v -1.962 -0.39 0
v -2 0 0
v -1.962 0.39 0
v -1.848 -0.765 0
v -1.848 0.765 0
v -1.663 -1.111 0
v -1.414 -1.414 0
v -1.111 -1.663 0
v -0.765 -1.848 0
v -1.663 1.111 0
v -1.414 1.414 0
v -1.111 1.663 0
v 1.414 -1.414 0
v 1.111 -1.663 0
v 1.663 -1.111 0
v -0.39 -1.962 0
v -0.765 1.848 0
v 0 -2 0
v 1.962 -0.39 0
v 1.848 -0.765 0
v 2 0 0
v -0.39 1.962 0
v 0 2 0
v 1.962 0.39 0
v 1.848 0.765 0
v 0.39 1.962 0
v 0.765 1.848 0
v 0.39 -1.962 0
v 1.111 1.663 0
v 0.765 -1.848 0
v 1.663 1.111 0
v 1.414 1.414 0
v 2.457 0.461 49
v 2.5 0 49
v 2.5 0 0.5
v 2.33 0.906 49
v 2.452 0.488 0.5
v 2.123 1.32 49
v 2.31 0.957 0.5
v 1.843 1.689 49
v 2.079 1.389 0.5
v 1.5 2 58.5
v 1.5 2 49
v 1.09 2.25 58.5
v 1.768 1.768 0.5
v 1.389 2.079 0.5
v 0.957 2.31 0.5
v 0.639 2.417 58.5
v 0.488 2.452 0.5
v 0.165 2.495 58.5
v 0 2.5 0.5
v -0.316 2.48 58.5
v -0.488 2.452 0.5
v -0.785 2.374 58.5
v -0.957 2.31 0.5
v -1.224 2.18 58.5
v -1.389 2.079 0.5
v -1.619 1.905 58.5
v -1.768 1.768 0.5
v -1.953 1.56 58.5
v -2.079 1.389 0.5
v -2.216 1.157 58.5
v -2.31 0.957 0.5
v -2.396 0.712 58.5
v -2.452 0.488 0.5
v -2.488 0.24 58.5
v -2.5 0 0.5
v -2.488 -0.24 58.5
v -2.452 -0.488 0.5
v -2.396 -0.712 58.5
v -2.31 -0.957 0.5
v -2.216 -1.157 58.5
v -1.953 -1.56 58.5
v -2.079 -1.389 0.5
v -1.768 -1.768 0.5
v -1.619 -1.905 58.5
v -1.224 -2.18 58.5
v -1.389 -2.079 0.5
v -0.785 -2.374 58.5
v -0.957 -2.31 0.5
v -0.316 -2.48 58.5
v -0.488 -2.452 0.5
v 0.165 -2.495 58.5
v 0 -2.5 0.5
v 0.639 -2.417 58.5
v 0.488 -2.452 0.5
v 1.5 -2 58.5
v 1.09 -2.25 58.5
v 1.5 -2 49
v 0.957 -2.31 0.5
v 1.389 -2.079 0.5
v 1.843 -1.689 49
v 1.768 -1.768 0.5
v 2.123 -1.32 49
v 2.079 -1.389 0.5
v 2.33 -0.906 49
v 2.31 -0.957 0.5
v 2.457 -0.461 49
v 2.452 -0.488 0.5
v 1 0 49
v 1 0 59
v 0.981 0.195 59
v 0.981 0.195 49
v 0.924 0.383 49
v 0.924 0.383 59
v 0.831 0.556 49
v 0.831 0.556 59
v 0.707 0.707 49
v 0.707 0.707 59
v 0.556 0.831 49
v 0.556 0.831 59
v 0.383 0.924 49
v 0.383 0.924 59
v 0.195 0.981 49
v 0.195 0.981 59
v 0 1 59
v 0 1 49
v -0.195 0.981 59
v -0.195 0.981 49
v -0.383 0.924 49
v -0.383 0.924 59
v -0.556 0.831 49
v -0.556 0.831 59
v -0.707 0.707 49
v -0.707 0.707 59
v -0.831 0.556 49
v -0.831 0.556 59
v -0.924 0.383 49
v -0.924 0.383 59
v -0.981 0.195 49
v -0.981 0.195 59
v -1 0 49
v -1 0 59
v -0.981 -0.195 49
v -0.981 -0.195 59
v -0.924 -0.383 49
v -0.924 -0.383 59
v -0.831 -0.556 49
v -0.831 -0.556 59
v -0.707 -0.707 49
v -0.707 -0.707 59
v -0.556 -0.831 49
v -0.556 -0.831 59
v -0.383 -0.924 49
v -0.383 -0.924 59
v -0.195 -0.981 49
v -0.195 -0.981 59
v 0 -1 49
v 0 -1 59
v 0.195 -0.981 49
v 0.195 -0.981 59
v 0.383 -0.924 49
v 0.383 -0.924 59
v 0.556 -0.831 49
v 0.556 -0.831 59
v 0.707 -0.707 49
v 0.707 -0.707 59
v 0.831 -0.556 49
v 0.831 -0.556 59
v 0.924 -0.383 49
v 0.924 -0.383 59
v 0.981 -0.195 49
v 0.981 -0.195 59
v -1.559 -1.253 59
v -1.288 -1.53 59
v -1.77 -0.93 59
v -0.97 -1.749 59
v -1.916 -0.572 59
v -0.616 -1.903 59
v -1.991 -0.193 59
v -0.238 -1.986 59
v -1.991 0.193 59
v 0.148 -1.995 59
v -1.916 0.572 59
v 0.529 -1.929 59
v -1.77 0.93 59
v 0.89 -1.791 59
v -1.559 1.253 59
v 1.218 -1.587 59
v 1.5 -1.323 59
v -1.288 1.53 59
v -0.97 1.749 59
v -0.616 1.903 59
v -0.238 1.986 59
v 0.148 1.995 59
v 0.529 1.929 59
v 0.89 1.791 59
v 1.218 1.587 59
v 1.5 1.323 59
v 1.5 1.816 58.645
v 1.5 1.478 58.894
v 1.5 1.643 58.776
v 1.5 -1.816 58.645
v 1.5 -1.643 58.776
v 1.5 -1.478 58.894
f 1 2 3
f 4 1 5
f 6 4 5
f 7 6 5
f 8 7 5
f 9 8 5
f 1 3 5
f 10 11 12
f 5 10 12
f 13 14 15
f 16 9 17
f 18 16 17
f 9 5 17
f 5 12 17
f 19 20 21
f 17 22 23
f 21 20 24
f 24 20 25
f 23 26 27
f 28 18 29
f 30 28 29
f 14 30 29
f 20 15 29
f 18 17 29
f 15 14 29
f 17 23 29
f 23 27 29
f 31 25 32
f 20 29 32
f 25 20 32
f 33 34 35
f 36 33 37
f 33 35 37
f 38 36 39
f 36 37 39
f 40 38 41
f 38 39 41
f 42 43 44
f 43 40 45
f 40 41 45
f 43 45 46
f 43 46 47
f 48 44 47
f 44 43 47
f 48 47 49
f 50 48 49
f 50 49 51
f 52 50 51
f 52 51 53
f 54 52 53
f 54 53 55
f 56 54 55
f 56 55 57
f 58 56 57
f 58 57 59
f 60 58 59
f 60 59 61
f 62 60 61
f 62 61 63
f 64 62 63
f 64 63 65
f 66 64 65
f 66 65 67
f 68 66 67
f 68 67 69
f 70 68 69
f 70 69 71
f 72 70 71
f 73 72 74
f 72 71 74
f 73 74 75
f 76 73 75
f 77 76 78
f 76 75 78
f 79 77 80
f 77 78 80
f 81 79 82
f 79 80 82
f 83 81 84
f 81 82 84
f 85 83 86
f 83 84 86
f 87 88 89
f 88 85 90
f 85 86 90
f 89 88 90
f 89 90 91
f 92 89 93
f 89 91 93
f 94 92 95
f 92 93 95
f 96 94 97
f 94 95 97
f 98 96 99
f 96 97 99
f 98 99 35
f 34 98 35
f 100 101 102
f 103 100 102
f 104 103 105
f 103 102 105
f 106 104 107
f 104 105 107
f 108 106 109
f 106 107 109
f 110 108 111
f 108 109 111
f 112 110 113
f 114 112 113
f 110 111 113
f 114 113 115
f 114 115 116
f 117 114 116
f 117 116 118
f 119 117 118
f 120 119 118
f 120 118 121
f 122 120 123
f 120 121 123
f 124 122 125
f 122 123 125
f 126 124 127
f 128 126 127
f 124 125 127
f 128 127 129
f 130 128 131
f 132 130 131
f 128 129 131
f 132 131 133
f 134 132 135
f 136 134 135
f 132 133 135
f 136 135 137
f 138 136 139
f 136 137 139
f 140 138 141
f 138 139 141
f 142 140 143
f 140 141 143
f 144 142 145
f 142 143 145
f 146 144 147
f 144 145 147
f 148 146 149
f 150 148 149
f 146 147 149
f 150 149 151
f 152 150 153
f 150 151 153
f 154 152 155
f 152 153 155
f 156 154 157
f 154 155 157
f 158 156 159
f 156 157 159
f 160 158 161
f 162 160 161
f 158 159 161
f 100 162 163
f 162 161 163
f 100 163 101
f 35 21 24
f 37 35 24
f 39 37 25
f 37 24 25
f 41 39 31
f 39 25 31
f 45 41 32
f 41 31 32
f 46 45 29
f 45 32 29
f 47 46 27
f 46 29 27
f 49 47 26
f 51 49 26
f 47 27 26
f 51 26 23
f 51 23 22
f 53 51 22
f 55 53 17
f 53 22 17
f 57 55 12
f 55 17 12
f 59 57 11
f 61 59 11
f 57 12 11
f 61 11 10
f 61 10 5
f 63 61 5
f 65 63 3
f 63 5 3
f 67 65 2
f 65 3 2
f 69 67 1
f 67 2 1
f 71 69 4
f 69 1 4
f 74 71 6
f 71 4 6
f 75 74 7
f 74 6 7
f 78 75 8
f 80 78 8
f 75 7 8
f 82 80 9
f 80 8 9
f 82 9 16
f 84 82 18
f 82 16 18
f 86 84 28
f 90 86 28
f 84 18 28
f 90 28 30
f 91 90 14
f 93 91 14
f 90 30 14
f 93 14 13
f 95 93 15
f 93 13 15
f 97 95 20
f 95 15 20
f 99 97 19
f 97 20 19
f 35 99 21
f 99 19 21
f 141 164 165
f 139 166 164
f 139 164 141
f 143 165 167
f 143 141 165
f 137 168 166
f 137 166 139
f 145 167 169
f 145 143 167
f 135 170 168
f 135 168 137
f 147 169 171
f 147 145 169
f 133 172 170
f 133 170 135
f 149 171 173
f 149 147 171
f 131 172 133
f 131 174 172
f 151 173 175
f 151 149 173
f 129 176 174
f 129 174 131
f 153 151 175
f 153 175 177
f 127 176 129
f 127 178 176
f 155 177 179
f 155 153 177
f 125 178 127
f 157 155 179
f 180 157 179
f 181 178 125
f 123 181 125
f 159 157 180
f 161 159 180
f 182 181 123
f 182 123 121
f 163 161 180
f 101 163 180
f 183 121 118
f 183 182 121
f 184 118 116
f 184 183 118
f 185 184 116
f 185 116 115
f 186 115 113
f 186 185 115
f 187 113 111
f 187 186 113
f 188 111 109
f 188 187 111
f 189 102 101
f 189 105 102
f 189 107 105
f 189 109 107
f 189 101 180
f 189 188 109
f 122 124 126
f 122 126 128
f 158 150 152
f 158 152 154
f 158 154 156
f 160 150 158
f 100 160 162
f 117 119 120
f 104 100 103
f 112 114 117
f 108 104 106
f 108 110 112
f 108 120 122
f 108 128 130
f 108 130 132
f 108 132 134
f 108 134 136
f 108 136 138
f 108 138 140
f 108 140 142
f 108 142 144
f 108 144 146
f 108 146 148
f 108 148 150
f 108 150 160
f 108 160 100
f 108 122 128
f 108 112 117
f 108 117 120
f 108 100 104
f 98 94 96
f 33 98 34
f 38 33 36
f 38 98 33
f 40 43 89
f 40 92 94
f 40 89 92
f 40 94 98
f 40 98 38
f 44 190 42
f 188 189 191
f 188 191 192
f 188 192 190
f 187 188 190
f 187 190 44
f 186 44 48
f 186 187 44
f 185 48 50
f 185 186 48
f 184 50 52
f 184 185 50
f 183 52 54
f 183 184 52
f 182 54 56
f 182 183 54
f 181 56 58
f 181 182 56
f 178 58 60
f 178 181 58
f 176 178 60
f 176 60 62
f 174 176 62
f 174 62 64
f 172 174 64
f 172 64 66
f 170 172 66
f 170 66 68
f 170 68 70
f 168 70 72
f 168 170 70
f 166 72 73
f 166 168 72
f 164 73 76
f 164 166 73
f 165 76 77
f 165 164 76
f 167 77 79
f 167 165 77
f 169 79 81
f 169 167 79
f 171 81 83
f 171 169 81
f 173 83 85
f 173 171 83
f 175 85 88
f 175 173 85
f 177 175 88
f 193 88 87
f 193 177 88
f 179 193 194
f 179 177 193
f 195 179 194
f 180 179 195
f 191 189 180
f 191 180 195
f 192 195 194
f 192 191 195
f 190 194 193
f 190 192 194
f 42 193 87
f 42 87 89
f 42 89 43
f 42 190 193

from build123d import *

# Parameters (mm, degrees)
SKETCH1_R           = 2.5
BOSS_EXTRUDE1_DEPTH = 59
SKETCH2_R           = 1
CUT_EXTRUDE1_DEPTH  = 10
CHAMFER1_SIZE       = 0.5
SKETCH3_W           = 1.530069222
SKETCH3_H           = 4.686409644
CUT_EXTRUDE2_DEPTH  = 10


with BuildPart() as part:
    # Sketch1 → Boss-Extrude1 (new body)
    with BuildSketch(Plane.XY):
        Circle(SKETCH1_R)
    extrude(amount=BOSS_EXTRUDE1_DEPTH)

    # Sketch2 → Cut-Extrude1 (cut)
    with BuildSketch(Plane.XY.offset(59)):
        Circle(SKETCH2_R)
    extrude(amount=-CUT_EXTRUDE1_DEPTH, mode=Mode.SUBTRACT)

    # Chamfer1
    chamfer1_edges = [part.edges().sort_by_distance(p)[0] for p in [
        (-2.5, 0, 0),
        (-2.5, 0, 59),
    ]]
    chamfer(chamfer1_edges, length=CHAMFER1_SIZE)

    # Sketch3 → Cut-Extrude2 (cut)
    with BuildSketch(Plane.XY.offset(59)):
        with Locations((2.265034611, -0.329447038)):
            Rectangle(SKETCH3_W, SKETCH3_H)
    extrude(amount=-CUT_EXTRUDE2_DEPTH, mode=Mode.SUBTRACT)


solid = part.part
